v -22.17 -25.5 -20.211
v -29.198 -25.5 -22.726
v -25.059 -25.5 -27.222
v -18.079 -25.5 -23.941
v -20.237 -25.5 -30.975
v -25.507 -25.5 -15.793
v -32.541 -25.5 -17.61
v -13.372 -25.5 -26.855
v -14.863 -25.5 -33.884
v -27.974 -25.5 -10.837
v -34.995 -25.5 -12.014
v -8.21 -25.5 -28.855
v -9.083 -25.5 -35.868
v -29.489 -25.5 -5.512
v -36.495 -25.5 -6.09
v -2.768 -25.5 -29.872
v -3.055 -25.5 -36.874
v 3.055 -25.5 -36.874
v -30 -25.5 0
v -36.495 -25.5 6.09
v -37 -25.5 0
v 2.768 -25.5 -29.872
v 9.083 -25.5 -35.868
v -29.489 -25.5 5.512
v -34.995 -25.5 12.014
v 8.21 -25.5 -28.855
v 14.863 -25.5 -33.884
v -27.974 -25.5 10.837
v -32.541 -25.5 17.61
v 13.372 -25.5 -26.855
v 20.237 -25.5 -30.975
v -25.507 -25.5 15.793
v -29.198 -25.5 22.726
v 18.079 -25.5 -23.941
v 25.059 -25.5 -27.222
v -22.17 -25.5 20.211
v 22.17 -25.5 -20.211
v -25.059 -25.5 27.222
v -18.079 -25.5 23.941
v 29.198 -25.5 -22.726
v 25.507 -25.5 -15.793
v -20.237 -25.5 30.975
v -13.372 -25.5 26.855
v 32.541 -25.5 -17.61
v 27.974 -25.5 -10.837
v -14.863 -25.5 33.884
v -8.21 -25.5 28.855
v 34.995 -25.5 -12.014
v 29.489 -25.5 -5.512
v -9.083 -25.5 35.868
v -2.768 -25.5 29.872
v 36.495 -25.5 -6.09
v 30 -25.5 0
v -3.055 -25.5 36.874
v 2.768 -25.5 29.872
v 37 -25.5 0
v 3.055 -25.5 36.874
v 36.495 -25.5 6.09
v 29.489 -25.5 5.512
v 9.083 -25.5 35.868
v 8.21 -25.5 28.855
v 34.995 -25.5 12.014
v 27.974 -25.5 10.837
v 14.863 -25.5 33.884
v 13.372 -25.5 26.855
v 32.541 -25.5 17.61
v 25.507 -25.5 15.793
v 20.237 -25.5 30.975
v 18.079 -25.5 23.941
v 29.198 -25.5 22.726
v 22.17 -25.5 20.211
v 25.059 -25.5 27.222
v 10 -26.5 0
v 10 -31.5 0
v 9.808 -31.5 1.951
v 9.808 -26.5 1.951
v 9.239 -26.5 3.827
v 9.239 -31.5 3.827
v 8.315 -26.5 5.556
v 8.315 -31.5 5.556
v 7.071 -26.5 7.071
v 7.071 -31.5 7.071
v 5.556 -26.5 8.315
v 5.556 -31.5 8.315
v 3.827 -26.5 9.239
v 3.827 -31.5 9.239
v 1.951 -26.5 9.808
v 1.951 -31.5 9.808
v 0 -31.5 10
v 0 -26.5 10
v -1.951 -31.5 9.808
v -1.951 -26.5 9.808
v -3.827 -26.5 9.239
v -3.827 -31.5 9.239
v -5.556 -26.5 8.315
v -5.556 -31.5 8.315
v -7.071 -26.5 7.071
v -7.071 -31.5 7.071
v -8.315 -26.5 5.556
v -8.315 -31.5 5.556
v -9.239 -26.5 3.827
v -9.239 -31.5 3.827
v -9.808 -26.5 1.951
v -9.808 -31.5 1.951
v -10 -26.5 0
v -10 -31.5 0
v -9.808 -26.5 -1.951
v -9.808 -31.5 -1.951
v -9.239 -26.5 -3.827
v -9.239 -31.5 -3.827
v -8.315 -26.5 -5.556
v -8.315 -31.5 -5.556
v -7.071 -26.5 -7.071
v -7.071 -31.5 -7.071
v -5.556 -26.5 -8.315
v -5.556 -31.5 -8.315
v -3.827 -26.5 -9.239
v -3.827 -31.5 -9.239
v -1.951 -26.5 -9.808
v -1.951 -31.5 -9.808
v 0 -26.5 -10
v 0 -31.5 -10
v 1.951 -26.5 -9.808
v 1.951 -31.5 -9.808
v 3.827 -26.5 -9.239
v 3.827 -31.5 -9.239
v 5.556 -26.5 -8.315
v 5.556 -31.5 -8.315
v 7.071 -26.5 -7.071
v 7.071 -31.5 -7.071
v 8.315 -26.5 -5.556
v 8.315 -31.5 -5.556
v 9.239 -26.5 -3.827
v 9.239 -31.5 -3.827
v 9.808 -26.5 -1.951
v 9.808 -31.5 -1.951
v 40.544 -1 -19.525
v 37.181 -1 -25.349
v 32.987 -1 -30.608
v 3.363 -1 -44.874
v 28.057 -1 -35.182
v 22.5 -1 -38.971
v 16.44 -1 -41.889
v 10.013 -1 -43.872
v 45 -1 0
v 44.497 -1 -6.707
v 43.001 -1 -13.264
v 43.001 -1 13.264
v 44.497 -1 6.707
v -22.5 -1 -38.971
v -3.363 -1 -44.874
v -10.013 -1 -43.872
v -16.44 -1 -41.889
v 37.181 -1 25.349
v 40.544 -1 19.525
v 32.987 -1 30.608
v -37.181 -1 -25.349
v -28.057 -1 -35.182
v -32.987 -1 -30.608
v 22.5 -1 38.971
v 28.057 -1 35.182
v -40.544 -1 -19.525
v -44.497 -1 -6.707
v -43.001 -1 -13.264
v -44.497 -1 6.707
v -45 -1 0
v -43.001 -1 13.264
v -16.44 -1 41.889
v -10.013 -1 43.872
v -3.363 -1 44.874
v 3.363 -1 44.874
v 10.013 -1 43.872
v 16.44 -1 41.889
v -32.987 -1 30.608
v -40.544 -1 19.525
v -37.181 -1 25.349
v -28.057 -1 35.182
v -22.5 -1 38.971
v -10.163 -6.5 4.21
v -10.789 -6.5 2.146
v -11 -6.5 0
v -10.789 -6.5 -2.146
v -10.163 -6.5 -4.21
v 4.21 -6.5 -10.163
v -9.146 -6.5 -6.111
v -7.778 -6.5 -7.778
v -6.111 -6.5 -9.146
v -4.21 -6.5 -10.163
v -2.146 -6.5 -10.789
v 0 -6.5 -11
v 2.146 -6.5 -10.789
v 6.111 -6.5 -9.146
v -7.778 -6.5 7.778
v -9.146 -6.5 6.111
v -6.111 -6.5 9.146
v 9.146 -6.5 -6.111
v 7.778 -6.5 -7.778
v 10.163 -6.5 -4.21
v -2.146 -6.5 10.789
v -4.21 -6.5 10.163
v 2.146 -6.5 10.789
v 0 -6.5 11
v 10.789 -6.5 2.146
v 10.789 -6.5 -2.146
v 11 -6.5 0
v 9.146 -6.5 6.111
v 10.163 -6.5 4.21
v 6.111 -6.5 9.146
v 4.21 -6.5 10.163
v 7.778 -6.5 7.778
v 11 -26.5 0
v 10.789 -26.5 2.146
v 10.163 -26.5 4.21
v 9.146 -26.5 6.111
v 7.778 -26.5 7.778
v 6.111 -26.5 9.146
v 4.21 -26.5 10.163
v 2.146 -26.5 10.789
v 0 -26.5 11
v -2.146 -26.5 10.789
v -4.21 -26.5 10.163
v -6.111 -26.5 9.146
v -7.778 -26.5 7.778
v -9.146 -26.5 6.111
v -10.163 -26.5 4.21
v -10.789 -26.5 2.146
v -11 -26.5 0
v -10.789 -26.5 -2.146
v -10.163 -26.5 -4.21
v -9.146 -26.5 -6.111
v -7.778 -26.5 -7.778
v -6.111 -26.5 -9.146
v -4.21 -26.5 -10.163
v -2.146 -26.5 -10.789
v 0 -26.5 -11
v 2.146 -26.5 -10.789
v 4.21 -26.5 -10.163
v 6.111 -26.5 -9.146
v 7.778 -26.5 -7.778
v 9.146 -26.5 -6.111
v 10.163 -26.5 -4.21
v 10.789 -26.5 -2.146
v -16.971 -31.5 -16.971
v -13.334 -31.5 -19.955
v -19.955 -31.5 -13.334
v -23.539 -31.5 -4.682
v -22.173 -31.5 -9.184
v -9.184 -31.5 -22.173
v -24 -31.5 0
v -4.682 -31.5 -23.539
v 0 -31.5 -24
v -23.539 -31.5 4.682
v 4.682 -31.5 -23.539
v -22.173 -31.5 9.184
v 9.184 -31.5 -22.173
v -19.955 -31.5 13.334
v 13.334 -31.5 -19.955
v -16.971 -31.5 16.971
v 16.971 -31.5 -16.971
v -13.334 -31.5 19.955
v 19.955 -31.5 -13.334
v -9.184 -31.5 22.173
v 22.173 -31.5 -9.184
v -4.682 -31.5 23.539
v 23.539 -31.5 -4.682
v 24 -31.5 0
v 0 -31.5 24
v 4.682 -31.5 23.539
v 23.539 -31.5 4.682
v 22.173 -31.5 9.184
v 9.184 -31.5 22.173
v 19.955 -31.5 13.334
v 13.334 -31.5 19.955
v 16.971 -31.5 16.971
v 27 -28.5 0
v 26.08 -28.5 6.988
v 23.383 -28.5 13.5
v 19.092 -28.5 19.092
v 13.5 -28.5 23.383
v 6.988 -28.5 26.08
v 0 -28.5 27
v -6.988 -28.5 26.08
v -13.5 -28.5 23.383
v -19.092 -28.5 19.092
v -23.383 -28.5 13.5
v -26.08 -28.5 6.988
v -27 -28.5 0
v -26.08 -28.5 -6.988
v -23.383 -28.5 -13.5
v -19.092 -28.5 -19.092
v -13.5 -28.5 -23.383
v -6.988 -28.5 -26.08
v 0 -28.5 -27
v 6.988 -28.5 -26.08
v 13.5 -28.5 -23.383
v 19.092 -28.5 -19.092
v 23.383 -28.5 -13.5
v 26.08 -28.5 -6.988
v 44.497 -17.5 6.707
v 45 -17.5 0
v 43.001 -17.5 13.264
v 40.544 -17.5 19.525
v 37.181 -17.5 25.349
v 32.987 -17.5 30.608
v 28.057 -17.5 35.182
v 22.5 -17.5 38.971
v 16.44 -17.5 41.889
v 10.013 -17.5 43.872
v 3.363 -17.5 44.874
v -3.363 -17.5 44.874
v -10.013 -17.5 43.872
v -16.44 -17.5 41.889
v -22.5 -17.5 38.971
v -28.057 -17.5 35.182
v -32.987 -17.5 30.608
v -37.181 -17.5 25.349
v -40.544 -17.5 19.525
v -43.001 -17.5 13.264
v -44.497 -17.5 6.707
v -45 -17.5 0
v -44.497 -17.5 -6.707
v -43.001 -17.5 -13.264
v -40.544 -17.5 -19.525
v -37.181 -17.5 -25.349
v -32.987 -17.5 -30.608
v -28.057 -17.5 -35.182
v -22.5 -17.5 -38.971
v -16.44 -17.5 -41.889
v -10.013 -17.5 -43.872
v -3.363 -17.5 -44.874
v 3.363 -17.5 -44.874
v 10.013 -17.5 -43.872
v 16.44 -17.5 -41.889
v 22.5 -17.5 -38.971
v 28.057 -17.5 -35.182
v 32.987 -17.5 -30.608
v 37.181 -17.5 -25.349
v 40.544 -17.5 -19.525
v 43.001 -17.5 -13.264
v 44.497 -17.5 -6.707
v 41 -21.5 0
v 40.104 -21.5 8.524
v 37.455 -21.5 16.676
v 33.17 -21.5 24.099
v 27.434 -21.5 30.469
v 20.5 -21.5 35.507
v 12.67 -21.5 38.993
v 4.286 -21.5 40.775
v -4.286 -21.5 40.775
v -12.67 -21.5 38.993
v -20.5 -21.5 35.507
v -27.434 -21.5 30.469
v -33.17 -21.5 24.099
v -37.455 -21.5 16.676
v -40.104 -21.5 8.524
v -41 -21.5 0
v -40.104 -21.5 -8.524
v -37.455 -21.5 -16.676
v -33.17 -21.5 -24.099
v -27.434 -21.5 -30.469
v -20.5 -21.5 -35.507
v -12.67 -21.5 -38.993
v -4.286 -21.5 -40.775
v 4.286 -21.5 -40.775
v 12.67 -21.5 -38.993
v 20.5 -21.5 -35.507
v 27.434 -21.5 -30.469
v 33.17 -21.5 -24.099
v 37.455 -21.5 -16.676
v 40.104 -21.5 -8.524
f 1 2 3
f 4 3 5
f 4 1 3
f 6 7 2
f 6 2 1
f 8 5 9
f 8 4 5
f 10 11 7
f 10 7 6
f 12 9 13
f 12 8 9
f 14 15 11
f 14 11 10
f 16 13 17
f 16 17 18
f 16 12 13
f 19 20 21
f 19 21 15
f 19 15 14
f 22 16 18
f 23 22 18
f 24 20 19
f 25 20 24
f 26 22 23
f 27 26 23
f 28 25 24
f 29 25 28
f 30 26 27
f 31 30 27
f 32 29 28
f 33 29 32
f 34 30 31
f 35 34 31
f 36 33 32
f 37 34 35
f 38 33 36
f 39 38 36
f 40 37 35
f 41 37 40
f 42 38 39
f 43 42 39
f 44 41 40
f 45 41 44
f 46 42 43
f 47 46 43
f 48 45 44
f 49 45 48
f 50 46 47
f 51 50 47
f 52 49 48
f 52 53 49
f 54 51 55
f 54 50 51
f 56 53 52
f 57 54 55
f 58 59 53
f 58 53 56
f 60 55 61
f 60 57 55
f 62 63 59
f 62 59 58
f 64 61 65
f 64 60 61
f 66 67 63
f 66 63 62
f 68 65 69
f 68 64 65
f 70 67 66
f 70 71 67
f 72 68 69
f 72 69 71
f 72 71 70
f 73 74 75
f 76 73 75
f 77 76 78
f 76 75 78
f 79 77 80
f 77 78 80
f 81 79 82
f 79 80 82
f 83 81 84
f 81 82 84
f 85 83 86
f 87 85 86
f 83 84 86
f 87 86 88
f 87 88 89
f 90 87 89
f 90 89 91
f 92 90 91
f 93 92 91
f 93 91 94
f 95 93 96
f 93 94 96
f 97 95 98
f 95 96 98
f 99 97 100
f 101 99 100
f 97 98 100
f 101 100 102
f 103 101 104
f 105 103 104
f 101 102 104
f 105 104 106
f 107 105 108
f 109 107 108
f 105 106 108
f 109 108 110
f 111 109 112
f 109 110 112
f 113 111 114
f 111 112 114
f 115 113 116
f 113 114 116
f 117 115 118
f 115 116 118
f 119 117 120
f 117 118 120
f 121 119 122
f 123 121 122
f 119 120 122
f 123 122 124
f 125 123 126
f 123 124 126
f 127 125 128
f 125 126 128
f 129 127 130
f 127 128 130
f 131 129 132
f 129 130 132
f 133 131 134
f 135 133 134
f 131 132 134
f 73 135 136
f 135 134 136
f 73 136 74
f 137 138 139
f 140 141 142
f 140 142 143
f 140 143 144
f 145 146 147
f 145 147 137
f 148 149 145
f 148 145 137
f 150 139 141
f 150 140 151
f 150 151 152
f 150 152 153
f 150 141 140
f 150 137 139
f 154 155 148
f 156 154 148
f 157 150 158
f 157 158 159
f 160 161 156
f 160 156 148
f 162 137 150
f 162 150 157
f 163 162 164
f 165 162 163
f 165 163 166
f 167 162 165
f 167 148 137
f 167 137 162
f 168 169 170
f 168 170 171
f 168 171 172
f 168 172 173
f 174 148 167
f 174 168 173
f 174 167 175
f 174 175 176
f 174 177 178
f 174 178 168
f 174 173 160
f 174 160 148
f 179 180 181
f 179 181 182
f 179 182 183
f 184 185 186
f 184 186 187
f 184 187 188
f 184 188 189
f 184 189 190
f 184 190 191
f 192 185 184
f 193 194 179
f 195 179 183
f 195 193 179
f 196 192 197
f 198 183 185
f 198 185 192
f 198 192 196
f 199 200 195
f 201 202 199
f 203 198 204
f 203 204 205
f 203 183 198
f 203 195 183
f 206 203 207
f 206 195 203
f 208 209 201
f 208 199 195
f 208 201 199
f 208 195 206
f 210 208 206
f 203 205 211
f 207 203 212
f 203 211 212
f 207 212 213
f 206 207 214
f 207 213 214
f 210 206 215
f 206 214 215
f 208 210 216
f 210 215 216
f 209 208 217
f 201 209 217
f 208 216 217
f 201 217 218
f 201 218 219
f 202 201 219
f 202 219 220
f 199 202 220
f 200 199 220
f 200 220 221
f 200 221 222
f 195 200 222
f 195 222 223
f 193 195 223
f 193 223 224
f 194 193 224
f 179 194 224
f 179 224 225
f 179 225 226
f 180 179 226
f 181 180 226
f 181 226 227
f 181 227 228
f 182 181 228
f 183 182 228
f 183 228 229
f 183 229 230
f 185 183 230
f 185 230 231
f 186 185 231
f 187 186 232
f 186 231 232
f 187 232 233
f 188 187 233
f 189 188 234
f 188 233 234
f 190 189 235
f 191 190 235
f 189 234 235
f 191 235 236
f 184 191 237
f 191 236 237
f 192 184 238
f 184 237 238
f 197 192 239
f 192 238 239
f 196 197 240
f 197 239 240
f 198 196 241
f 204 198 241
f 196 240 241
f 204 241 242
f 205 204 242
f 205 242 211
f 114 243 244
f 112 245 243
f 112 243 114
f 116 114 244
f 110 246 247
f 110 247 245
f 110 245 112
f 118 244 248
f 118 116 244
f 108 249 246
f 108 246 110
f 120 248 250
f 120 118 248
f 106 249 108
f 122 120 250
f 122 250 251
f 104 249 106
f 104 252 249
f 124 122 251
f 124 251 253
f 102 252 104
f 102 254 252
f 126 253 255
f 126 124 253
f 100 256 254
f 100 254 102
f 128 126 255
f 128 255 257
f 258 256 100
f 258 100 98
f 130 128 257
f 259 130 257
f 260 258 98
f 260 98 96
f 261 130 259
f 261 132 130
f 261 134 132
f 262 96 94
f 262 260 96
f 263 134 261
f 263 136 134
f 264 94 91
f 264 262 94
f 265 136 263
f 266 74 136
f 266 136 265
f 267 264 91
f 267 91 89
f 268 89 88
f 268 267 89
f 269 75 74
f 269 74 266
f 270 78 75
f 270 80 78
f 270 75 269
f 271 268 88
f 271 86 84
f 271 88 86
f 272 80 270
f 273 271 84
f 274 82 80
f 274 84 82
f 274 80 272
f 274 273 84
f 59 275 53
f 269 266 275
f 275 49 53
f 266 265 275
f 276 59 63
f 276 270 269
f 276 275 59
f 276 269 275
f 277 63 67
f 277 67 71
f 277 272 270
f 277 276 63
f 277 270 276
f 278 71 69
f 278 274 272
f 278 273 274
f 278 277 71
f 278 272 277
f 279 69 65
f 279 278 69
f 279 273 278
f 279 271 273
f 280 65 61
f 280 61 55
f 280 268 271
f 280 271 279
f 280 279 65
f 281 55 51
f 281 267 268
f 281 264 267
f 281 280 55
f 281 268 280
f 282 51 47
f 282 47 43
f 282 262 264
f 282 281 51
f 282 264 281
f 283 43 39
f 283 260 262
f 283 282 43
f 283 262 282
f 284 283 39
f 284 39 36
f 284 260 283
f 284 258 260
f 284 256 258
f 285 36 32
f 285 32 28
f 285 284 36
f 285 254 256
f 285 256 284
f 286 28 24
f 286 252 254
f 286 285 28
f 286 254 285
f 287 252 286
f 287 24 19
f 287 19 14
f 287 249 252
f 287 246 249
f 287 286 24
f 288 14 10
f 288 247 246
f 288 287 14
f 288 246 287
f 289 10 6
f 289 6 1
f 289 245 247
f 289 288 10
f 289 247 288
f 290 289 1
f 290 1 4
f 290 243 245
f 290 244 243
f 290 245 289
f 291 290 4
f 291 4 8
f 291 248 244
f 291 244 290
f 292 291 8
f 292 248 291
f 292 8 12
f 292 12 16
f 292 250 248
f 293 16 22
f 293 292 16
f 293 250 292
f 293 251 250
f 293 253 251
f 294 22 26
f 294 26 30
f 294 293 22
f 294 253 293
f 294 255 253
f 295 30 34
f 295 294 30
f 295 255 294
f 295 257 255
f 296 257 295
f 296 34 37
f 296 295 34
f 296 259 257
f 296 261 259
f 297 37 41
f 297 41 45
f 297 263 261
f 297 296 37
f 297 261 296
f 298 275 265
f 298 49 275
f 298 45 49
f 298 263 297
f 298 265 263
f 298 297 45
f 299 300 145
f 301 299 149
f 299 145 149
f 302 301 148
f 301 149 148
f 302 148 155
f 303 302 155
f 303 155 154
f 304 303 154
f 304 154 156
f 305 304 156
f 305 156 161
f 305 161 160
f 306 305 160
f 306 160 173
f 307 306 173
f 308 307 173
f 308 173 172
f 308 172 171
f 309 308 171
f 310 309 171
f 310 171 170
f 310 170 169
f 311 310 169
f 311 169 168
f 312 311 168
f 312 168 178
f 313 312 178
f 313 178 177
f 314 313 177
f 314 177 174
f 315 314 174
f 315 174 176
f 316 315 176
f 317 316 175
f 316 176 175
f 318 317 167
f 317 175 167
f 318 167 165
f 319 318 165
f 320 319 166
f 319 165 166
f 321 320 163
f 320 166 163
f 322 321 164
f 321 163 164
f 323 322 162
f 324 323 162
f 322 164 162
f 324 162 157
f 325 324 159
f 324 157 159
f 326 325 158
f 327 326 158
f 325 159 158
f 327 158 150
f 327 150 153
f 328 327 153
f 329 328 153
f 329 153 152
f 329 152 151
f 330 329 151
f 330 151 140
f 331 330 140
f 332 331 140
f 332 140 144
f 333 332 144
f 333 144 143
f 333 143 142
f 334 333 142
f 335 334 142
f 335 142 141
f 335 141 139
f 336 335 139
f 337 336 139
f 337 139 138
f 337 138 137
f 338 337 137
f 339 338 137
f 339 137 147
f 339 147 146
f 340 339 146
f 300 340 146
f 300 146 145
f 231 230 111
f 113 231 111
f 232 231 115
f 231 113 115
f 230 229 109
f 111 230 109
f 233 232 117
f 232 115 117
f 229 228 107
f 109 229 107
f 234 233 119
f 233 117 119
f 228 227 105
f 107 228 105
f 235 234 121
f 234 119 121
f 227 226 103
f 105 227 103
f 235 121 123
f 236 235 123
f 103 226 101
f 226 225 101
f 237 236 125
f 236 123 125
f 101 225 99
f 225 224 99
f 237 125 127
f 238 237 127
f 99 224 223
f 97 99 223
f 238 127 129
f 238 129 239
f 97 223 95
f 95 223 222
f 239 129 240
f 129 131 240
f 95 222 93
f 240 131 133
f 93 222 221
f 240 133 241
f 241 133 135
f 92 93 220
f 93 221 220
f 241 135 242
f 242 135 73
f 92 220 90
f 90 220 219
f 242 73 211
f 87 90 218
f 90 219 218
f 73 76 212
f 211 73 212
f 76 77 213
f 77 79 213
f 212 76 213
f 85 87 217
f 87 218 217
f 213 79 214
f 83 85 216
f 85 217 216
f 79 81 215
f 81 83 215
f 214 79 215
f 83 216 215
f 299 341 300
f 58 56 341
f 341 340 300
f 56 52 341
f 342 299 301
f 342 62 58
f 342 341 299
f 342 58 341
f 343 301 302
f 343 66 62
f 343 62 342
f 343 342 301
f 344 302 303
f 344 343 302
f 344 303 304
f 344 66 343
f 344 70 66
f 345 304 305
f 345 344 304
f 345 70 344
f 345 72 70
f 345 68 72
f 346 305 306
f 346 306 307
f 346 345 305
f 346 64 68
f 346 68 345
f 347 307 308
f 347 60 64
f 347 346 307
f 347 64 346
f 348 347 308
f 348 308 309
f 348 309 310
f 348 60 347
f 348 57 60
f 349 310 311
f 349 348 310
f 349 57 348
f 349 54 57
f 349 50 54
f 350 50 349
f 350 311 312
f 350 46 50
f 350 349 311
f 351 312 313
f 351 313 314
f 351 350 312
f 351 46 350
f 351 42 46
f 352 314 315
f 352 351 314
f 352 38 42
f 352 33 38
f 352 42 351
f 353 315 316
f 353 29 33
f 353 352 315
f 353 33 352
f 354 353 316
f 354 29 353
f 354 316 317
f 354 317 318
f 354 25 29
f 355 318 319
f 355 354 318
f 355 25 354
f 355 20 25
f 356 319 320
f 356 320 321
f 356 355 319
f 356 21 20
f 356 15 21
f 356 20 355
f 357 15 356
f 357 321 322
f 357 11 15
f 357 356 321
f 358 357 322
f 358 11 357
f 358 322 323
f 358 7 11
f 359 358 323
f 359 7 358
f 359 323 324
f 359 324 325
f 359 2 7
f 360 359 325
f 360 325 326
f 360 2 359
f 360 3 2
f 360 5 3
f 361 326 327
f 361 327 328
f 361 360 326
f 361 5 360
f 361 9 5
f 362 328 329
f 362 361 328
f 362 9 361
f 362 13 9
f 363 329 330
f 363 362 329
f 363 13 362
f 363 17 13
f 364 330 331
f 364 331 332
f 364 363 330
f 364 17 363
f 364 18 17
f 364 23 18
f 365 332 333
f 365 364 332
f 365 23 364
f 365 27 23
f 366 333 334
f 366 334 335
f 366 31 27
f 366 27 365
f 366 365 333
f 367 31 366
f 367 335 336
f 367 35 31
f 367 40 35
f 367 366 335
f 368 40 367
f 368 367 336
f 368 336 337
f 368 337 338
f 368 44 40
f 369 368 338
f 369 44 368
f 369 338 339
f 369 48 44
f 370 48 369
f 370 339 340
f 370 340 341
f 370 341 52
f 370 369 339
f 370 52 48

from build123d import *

# Parameters (mm, degrees)
F0_R      = 45
F1_DEPTH  = 25.5
F2_R      = 58
F3_DEPTH  = 1
F4_SIZE   = 8
F5_R      = 30
F6_DEPTH  = 6
F7_SIZE   = 5.99999
F9_R      = 11
F10_DEPTH = 25
F11_R     = 11
F11_R_2   = 10
F12_DEPTH = 5


# Not quite as in the source:
# - a fillet or chamfer is up to 0.001 mm smaller than in the source, because OpenCascade refuses the exact size


with BuildPart() as f1:
    # F0 (on Front) → F1 (new body)
    with BuildSketch(Plane.XZ):
        Circle(F0_R)
    extrude(amount=F1_DEPTH)

    # F2 (on face) → F3 (cut)
    with BuildSketch(Plane(origin=(0, 0, 0), x_dir=(-1, 0, 0), z_dir=(0, 1, 0))):
        Circle(F2_R)
    extrude(amount=-F3_DEPTH, mode=Mode.SUBTRACT)

    # F4
    f4_edges = [f1.edges().sort_by_distance(p)[0] for p in [
        (-45, -25.5, 0),
    ]]
    chamfer(f4_edges, length=F4_SIZE)

    # F5 (on face) → F6 (join)
    with BuildSketch(Plane.XZ.offset(25.5)):
        Circle(F5_R)
    extrude(amount=F6_DEPTH)

    # F7 (size 6 in the source; OpenCascade refuses exactly that, so slightly less here)
    f7_edges = [f1.edges().sort_by_distance(p)[0] for p in [
        (-30, -31.5, 0),
    ]]
    chamfer(f7_edges, length=F7_SIZE)

    # F9 (on face) → F10 (cut)
    with BuildSketch(Plane.XZ.offset(31.5)):
        Circle(F9_R)
    extrude(amount=-F10_DEPTH, mode=Mode.SUBTRACT)

    # F11 (on face) → F12 (join)
    with BuildSketch(Plane.XZ.offset(31.5)):
        Circle(F11_R)
        Circle(F11_R_2, mode=Mode.SUBTRACT)
    extrude(amount=-F12_DEPTH)


solid = f1.part
